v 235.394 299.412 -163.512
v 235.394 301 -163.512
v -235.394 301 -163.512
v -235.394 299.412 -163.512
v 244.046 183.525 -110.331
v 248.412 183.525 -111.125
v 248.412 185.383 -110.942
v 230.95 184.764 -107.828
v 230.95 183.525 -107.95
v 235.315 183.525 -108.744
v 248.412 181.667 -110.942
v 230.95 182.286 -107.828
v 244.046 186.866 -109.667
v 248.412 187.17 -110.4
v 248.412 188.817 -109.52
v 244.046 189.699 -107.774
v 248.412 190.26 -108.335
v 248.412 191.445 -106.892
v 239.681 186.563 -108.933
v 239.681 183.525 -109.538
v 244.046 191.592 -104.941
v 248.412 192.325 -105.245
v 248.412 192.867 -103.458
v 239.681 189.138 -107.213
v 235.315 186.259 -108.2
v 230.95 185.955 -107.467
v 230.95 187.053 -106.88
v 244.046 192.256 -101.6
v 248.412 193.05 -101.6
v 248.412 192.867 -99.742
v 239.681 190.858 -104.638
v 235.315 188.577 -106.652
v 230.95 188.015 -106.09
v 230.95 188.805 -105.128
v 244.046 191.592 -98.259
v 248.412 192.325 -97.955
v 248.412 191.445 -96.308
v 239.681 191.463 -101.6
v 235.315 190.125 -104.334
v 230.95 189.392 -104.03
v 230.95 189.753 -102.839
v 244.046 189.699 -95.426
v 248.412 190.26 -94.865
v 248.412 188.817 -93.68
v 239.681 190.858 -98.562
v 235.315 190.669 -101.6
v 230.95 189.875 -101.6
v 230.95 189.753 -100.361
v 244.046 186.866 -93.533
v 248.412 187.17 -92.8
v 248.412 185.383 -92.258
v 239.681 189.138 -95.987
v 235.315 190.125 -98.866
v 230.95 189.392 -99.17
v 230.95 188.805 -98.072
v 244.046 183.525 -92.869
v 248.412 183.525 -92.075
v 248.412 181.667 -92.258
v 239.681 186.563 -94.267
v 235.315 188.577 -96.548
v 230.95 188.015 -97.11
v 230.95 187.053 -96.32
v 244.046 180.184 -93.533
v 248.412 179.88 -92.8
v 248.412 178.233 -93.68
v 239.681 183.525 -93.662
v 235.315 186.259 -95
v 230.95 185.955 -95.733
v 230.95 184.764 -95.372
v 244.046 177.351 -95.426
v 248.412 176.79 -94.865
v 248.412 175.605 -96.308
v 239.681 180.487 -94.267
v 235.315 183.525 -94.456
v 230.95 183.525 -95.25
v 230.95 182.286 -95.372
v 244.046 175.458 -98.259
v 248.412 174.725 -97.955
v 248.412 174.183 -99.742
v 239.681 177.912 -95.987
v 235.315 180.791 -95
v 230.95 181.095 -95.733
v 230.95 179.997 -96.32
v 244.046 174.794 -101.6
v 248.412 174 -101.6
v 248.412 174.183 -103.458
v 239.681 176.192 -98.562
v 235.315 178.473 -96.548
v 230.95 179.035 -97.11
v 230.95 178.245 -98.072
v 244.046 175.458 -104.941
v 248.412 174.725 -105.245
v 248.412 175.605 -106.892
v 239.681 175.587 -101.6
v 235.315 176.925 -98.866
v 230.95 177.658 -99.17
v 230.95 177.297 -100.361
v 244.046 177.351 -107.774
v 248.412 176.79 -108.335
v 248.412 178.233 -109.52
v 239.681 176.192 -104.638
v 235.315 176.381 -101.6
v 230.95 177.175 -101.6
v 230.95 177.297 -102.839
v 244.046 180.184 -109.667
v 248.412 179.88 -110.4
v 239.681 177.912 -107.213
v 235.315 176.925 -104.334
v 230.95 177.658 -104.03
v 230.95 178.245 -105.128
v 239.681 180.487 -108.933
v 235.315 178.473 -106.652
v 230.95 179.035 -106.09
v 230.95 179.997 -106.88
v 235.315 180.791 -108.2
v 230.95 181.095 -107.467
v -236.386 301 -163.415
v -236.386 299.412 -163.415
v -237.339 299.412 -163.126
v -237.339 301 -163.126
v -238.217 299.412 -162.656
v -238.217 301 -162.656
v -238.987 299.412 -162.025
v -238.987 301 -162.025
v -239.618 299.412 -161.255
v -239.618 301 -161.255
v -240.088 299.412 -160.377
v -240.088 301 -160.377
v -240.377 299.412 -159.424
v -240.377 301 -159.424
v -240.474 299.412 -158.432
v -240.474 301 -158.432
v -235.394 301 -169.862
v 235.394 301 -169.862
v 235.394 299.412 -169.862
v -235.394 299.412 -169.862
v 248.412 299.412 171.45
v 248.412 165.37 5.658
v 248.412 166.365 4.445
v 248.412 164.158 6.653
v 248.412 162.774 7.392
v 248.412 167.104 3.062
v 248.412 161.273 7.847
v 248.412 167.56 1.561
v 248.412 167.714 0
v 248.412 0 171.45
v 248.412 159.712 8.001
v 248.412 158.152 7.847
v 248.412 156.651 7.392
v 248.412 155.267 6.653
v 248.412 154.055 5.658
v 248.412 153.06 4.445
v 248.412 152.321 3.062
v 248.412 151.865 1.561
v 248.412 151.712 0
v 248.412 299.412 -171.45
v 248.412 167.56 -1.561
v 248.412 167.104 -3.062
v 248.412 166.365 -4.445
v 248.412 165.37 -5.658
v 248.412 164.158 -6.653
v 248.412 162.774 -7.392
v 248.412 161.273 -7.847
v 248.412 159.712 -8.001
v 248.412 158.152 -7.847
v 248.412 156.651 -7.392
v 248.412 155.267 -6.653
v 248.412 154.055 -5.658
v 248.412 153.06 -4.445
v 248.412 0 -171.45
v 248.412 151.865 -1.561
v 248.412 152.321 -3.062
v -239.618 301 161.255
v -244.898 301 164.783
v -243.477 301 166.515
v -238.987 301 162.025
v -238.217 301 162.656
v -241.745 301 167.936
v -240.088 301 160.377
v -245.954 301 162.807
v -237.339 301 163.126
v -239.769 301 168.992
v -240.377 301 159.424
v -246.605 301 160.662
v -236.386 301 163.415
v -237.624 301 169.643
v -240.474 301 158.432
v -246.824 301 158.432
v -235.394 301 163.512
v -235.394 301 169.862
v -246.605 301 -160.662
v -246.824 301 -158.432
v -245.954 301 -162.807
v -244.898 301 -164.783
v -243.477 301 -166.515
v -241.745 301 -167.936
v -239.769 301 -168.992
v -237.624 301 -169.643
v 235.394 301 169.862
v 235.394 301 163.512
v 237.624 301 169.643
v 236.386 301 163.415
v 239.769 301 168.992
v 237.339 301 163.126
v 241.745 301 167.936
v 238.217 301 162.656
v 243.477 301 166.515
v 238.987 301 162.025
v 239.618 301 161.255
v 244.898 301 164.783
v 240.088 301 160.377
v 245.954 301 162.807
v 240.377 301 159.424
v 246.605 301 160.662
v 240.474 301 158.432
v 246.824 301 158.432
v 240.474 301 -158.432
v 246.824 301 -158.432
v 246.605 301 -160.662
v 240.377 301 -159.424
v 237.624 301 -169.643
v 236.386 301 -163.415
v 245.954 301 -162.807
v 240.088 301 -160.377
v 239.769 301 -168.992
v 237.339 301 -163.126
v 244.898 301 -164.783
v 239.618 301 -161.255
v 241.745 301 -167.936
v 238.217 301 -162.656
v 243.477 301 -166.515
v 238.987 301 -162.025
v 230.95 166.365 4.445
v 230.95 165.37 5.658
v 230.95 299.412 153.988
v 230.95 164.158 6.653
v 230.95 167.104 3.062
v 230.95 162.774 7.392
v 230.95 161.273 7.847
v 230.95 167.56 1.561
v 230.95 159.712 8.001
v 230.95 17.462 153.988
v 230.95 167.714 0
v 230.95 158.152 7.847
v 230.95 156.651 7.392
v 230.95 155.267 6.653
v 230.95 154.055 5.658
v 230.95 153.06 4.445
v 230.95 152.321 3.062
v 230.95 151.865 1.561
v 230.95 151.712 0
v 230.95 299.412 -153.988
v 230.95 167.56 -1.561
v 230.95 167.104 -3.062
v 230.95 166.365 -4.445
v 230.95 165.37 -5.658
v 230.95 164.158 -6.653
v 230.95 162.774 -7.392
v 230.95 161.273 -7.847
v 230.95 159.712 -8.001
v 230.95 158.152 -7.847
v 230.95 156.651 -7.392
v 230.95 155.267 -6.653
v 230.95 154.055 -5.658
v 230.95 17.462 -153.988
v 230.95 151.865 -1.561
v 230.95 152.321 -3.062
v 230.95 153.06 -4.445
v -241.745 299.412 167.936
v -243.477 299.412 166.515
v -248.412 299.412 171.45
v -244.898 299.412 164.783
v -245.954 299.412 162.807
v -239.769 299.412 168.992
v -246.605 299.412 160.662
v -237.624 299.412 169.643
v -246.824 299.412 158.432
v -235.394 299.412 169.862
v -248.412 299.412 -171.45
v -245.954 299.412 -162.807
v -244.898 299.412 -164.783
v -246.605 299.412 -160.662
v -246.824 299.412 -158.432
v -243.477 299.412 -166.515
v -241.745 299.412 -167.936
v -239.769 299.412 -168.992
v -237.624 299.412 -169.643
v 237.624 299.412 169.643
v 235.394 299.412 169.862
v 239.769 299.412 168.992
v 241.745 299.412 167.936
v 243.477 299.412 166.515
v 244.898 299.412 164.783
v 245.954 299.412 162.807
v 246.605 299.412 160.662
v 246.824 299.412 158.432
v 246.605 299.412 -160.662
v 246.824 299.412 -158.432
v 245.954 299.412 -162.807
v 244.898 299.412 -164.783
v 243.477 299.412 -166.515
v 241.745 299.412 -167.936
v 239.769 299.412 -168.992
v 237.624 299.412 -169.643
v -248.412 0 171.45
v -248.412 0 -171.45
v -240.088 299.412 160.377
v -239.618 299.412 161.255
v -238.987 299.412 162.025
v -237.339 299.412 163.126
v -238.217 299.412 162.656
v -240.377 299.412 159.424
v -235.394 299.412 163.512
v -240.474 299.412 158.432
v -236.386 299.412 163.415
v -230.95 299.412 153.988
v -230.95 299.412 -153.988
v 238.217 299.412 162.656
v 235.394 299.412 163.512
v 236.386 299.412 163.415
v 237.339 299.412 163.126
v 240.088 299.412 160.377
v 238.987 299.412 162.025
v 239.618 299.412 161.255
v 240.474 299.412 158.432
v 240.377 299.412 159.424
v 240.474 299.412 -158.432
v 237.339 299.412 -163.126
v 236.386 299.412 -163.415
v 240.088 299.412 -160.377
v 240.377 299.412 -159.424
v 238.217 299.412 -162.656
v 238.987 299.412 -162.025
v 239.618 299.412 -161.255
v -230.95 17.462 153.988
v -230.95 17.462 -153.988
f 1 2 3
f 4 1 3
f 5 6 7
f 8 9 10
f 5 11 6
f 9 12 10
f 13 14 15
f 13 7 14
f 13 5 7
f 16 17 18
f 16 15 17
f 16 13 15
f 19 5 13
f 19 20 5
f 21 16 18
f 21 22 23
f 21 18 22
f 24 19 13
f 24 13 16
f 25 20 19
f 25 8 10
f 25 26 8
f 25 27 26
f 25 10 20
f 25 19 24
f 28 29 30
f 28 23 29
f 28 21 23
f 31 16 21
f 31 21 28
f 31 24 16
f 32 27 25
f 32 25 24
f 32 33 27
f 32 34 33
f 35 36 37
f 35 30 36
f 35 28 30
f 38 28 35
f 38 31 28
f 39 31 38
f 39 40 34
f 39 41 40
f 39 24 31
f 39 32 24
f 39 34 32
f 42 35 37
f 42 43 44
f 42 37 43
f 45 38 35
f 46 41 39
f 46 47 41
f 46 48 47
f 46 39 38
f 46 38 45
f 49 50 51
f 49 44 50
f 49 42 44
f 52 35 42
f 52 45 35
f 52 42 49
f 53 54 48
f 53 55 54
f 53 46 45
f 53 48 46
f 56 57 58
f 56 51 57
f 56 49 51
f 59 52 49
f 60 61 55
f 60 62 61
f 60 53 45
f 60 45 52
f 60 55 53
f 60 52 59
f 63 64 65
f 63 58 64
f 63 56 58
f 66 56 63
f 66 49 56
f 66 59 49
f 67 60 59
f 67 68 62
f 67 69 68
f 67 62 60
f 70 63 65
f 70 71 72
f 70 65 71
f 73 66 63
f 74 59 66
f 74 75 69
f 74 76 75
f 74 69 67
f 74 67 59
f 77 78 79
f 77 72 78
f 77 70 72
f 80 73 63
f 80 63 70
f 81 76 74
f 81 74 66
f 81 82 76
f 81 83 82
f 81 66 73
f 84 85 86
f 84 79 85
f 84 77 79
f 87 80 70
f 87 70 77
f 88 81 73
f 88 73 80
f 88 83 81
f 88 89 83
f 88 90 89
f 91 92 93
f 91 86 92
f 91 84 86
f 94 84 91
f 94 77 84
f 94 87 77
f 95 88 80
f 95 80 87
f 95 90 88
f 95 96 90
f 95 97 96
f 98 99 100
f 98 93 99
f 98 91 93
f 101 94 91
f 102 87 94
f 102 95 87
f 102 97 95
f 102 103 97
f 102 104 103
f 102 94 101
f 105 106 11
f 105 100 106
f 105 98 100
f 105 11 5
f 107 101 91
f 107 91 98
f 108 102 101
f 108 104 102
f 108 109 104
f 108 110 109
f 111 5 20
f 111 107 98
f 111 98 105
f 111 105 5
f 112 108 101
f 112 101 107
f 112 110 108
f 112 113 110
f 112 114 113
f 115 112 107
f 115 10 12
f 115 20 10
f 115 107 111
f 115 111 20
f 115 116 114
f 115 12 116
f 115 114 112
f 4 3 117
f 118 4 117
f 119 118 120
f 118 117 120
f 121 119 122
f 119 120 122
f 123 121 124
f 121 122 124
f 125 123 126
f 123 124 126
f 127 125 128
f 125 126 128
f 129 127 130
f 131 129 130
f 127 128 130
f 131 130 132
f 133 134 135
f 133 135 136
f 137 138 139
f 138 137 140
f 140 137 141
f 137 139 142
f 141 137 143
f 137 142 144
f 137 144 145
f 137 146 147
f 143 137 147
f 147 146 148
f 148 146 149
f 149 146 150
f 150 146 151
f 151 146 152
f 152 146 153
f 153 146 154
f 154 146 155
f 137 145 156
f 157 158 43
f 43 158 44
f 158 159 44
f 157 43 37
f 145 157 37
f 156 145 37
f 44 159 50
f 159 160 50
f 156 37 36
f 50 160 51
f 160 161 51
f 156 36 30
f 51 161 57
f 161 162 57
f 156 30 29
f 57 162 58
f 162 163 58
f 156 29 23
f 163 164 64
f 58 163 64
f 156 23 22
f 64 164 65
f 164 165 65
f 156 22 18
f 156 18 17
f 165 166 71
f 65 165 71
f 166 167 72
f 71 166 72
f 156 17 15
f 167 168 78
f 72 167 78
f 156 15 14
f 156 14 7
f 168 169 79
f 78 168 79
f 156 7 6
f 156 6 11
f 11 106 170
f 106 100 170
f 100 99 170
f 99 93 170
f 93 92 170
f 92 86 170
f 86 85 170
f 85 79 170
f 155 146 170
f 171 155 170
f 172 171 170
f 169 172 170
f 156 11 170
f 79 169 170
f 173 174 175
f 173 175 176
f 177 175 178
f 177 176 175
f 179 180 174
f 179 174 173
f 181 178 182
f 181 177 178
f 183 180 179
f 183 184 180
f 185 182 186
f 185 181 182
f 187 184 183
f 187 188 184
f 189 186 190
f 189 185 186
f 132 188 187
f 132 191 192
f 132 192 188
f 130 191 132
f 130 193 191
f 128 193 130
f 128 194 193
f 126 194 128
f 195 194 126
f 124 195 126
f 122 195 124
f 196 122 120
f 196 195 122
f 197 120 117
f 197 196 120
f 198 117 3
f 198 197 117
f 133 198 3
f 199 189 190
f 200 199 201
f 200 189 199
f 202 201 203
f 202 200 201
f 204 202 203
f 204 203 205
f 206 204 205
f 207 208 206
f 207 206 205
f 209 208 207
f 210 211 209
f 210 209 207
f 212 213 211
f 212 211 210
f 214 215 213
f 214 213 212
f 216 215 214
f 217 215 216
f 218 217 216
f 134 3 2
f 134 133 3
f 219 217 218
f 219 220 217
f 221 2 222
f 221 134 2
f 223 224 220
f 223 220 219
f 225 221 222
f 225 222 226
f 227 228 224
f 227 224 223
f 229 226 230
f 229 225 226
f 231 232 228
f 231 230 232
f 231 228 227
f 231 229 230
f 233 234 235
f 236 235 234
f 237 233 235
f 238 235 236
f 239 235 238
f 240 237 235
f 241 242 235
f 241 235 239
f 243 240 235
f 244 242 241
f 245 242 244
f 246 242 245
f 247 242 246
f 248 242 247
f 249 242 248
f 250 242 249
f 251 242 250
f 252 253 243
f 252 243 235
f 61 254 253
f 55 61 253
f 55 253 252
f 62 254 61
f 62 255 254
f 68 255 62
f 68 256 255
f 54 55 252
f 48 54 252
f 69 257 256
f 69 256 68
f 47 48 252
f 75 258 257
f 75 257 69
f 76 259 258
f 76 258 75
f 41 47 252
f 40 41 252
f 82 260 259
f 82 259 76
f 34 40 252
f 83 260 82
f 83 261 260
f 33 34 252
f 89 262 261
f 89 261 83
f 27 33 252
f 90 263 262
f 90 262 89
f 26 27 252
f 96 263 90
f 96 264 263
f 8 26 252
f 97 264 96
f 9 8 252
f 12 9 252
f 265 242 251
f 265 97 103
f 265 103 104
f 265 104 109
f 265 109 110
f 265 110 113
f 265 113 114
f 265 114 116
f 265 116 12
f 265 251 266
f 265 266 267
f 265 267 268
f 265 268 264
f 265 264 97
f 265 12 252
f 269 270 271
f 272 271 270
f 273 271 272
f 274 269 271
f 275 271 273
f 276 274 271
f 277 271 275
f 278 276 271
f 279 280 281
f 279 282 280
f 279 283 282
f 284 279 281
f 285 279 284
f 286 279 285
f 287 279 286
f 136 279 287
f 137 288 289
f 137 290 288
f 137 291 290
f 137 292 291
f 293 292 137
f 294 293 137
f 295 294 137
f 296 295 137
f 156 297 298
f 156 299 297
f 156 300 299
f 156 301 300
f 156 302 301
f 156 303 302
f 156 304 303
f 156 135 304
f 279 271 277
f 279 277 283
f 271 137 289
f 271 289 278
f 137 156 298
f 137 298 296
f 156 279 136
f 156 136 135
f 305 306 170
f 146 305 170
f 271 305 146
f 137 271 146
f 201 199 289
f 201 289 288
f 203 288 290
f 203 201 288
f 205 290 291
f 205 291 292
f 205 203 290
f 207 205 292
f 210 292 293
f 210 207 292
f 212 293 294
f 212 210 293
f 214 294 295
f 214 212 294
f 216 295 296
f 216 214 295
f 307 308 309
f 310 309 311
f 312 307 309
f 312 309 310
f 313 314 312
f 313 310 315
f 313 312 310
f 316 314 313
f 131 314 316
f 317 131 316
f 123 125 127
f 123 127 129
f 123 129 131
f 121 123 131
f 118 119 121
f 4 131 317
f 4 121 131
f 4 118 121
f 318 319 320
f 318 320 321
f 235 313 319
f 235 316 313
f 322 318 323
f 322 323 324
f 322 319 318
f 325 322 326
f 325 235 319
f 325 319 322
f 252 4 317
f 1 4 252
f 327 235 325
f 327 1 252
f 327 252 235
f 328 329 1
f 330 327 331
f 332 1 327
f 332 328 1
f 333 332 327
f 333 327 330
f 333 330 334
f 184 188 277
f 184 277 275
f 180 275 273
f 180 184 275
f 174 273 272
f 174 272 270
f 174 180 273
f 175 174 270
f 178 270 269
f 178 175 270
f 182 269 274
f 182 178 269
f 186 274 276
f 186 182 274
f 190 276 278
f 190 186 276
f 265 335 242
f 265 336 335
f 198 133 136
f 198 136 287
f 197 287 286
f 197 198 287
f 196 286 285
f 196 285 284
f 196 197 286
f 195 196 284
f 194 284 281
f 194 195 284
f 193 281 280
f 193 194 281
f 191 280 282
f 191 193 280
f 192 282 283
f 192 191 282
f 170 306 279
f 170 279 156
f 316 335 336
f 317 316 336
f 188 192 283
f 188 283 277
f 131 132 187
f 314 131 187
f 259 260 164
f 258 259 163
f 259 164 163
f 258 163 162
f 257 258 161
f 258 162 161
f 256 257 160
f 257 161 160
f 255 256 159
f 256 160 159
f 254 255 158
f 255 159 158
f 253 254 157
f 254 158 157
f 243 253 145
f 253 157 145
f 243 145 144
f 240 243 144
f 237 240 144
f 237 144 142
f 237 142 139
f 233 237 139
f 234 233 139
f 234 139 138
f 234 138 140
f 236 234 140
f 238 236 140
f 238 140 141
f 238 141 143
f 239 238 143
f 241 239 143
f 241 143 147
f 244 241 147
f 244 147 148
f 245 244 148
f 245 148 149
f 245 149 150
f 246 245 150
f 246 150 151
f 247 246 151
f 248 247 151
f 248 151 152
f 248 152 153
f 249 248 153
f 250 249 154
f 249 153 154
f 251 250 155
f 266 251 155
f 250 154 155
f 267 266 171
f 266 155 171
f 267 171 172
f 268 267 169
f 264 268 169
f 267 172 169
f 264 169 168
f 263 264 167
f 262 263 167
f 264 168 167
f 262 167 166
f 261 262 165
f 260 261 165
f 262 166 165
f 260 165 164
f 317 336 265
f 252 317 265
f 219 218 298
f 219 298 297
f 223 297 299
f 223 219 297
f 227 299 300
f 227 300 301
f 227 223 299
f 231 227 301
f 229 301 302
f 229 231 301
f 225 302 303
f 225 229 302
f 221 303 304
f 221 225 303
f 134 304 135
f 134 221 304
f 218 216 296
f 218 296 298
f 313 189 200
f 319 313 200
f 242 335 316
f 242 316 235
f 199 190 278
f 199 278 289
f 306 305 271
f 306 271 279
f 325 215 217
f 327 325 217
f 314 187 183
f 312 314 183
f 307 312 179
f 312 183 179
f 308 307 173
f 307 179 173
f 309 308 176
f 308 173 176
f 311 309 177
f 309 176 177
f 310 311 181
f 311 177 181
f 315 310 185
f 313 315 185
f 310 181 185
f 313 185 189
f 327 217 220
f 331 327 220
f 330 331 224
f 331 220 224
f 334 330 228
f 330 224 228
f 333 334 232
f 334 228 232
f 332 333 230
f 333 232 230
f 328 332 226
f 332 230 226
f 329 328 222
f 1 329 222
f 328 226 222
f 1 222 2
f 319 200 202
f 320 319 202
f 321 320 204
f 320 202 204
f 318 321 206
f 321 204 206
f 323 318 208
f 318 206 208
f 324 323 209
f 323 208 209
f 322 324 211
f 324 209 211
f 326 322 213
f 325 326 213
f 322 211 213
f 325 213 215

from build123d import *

# Parameters (mm, degrees)
SKETCH1_W           = 496.824
SKETCH1_H           = 342.9
BOSS_EXTRUDE1_DEPTH = 17.4625
BOSS_EXTRUDE2_START = -17.4625
SKETCH2_W           = 496.824
SKETCH2_H           = 342.9
SKETCH2_W_2         = 461.899
SKETCH2_H_2         = 307.975
BOSS_EXTRUDE2_DEPTH = 301
SKETCH11_W          = 461.899
SKETCH11_H          = 307.975
CUT_EXTRUDE2_DEPTH  = 1.5875
SKETCH30_R          = 9.525
CUT_EXTRUDE4_DEPTH  = 17.4625
CUT_EXTRUDE4_TAPER  = 10.304
SKETCH34_W          = 496.824
SKETCH34_H          = 342.9
CUT_EXTRUDE5_DEPTH  = 1.5875
CUT_EXTRUDE6_REACH  = 498.824
SKETCH35_R          = 8.001


with BuildPart() as part:
    # Sketch1 → Boss-Extrude1 (new body)
    with BuildSketch(Plane(origin=(0, 0, 0), x_dir=(1, 0, 0), z_dir=(0, 1, 0))):
        Rectangle(SKETCH1_W, SKETCH1_H)
    extrude(amount=BOSS_EXTRUDE1_DEPTH)

    # Sketch2 → Boss-Extrude2 (add)
    with BuildSketch(Plane(origin=(0, 17.4625, 0), x_dir=(1, 0, 0), z_dir=(0, 1, 0)).offset(BOSS_EXTRUDE2_START)):
        Rectangle(SKETCH2_W, SKETCH2_H)
        Rectangle(SKETCH2_W_2, SKETCH2_H_2, mode=Mode.SUBTRACT)
    extrude(amount=BOSS_EXTRUDE2_DEPTH)

    # Sketch11 → Cut-Extrude2 (cut)
    with BuildSketch(Plane(origin=(0, 301, 0), x_dir=(1, 0, 0), z_dir=(0, 1, 0))):
        with BuildLine():
            Line((235.3945, 163.5125), (-235.3945, 163.5125))
            ThreePointArc((-235.3945, 163.5125), (-238.986602448, 162.024602448), (-240.4745, 158.4325))
            Line((-240.4745, 158.4325), (-240.4745, -158.4325))
            ThreePointArc((-240.4745, -158.4325), (-238.986602448, -162.024602448), (-235.3945, -163.5125))
            Line((-235.3945, -163.5125), (235.3945, -163.5125))
            ThreePointArc((235.3945, -163.5125), (238.986602448, -162.024602448), (240.4745, -158.4325))
            Line((240.4745, -158.4325), (240.4745, 158.4325))
            ThreePointArc((240.4745, 158.4325), (238.986602448, 162.024602448), (235.3945, 163.5125))
        make_face()
        Rectangle(SKETCH11_W, SKETCH11_H, mode=Mode.SUBTRACT)
    extrude(amount=-CUT_EXTRUDE2_DEPTH, mode=Mode.SUBTRACT)

    # Sketch30 → Cut-Extrude4 (cut)
    with BuildSketch(Plane(origin=(248.412, 0, 0), x_dir=(0, 0, -1), z_dir=(1, 0, 0))):
        with Locations((101.6, 183.525)):
            Circle(SKETCH30_R)
    extrude(amount=-CUT_EXTRUDE4_DEPTH, taper=CUT_EXTRUDE4_TAPER, mode=Mode.SUBTRACT)

    # Sketch34 → Cut-Extrude5 (cut)
    with BuildSketch(Plane(origin=(0, 301, 0), x_dir=(1, 0, 0), z_dir=(0, 1, 0))):
        Rectangle(SKETCH34_W, SKETCH34_H)
        with BuildLine():
            Line((-235.3945, -169.8625), (235.3945, -169.8625))
            ThreePointArc((235.3945, -169.8625), (243.476730509, -166.514730509), (246.8245, -158.4325))
            Line((246.8245, -158.4325), (246.8245, 158.4325))
            ThreePointArc((246.8245, 158.4325), (243.476730509, 166.514730509), (235.3945, 169.8625))
            Line((235.3945, 169.8625), (-235.3945, 169.8625))
            ThreePointArc((-235.3945, 169.8625), (-243.476730509, 166.514730509), (-246.8245, 158.4325))
            Line((-246.8245, 158.4325), (-246.8245, -158.4325))
            ThreePointArc((-246.8245, -158.4325), (-243.476730509, -166.514730509), (-235.3945, -169.8625))
        make_face(mode=Mode.SUBTRACT)
    extrude(amount=-CUT_EXTRUDE5_DEPTH, mode=Mode.SUBTRACT)

    # Sketch35 → Cut-Extrude6 (cut, up to next)
    with BuildSketch(Plane(origin=(248.412, 0, 0), x_dir=(0, 0, -1), z_dir=(1, 0, 0)), mode=Mode.PRIVATE) as cut_extrude6_sk1:
        with Locations((0, 159.7125)):
            Circle(SKETCH35_R)
    cut_extrude6_tool1 = extrude(cut_extrude6_sk1.sketch, amount=-CUT_EXTRUDE6_REACH, mode=Mode.PRIVATE) & part.part
    add(cut_extrude6_tool1.solids().sort_by_distance((248.412, 159.7125, 0))[0], mode=Mode.SUBTRACT)


solid = part.part
